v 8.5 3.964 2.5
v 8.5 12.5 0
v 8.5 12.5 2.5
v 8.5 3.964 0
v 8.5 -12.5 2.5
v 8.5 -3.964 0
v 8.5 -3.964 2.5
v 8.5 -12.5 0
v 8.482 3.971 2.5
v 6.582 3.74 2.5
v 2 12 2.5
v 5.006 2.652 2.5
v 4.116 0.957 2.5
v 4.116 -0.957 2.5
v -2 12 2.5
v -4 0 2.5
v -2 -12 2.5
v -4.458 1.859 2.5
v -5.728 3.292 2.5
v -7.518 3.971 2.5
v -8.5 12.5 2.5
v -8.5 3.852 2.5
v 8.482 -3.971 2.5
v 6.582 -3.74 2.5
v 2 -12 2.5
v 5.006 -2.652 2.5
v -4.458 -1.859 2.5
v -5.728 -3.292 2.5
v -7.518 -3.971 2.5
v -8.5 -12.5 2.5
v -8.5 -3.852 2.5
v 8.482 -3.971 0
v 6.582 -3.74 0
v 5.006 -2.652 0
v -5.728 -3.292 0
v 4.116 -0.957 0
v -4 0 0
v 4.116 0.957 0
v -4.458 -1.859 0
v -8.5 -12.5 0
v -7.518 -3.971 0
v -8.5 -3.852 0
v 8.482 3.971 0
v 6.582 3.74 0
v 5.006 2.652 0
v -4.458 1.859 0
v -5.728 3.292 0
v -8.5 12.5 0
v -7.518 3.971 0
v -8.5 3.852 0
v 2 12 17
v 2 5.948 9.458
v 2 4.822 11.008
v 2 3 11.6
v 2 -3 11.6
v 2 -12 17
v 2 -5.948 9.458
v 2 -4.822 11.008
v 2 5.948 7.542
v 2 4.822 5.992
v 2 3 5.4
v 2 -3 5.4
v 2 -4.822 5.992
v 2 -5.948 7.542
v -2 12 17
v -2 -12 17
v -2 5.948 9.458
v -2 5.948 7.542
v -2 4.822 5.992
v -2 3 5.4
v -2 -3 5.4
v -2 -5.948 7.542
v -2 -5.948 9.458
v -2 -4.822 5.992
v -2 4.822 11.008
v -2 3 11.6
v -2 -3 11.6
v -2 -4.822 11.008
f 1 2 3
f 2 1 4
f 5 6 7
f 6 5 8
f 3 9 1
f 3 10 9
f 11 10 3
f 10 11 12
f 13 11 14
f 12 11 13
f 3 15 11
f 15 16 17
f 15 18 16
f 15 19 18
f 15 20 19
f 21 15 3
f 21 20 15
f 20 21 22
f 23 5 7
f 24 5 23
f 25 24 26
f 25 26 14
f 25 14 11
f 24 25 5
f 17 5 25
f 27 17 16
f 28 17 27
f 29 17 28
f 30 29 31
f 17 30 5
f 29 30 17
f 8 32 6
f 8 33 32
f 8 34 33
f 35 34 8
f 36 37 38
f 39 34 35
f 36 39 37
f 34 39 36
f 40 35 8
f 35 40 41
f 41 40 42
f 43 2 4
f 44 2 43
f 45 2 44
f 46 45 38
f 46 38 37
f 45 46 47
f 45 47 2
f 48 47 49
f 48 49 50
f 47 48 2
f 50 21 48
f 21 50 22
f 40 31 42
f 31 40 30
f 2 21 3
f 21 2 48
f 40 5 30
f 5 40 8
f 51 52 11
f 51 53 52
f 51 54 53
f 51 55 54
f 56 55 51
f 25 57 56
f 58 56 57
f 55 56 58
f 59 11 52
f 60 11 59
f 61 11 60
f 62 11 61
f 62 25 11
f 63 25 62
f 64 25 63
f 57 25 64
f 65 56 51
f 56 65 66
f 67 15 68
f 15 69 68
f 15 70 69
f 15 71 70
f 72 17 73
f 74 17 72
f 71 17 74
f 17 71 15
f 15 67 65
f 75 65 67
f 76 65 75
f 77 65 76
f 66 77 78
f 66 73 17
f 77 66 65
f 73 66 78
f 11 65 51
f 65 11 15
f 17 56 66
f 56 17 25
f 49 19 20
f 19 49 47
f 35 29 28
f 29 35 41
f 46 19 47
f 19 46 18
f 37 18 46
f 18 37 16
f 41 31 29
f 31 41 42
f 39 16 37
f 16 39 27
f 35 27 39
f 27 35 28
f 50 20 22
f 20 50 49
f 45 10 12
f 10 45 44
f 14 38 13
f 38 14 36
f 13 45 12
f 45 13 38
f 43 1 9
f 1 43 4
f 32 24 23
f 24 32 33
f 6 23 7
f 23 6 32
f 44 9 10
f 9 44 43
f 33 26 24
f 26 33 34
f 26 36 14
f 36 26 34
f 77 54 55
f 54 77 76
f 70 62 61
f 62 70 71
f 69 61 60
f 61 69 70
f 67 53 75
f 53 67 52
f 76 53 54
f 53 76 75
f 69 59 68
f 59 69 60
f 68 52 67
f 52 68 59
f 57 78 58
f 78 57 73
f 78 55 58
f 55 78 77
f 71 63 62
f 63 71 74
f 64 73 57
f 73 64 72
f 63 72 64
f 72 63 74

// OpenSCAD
//cylinder(h = height, r1 = BottomRadius, r2 = TopRadius, center = true/false);

//cube(size = [x,y,z], center = true/false);

difference() {
union() {
    translate([-8.5,-12.5,0]) cube(size = [17,25,2.5]);

translate([-2,-12,0]) cube(size = [4,24,17]);
}

translate([-8,0,0]) cylinder(h = 50, r = 4);
translate([8,0,0]) cylinder(h = 50, r = 4);

translate([-10,-3,5.4]) cube(size = [20,6,6.2]);

translate([-20,3,8.5]) rotate([0,90,0]) cylinder(h = 40, r = 3.1);

translate([-20,-3,8.5]) rotate([0,90,0]) cylinder(h = 40, r = 3.1);
 }
